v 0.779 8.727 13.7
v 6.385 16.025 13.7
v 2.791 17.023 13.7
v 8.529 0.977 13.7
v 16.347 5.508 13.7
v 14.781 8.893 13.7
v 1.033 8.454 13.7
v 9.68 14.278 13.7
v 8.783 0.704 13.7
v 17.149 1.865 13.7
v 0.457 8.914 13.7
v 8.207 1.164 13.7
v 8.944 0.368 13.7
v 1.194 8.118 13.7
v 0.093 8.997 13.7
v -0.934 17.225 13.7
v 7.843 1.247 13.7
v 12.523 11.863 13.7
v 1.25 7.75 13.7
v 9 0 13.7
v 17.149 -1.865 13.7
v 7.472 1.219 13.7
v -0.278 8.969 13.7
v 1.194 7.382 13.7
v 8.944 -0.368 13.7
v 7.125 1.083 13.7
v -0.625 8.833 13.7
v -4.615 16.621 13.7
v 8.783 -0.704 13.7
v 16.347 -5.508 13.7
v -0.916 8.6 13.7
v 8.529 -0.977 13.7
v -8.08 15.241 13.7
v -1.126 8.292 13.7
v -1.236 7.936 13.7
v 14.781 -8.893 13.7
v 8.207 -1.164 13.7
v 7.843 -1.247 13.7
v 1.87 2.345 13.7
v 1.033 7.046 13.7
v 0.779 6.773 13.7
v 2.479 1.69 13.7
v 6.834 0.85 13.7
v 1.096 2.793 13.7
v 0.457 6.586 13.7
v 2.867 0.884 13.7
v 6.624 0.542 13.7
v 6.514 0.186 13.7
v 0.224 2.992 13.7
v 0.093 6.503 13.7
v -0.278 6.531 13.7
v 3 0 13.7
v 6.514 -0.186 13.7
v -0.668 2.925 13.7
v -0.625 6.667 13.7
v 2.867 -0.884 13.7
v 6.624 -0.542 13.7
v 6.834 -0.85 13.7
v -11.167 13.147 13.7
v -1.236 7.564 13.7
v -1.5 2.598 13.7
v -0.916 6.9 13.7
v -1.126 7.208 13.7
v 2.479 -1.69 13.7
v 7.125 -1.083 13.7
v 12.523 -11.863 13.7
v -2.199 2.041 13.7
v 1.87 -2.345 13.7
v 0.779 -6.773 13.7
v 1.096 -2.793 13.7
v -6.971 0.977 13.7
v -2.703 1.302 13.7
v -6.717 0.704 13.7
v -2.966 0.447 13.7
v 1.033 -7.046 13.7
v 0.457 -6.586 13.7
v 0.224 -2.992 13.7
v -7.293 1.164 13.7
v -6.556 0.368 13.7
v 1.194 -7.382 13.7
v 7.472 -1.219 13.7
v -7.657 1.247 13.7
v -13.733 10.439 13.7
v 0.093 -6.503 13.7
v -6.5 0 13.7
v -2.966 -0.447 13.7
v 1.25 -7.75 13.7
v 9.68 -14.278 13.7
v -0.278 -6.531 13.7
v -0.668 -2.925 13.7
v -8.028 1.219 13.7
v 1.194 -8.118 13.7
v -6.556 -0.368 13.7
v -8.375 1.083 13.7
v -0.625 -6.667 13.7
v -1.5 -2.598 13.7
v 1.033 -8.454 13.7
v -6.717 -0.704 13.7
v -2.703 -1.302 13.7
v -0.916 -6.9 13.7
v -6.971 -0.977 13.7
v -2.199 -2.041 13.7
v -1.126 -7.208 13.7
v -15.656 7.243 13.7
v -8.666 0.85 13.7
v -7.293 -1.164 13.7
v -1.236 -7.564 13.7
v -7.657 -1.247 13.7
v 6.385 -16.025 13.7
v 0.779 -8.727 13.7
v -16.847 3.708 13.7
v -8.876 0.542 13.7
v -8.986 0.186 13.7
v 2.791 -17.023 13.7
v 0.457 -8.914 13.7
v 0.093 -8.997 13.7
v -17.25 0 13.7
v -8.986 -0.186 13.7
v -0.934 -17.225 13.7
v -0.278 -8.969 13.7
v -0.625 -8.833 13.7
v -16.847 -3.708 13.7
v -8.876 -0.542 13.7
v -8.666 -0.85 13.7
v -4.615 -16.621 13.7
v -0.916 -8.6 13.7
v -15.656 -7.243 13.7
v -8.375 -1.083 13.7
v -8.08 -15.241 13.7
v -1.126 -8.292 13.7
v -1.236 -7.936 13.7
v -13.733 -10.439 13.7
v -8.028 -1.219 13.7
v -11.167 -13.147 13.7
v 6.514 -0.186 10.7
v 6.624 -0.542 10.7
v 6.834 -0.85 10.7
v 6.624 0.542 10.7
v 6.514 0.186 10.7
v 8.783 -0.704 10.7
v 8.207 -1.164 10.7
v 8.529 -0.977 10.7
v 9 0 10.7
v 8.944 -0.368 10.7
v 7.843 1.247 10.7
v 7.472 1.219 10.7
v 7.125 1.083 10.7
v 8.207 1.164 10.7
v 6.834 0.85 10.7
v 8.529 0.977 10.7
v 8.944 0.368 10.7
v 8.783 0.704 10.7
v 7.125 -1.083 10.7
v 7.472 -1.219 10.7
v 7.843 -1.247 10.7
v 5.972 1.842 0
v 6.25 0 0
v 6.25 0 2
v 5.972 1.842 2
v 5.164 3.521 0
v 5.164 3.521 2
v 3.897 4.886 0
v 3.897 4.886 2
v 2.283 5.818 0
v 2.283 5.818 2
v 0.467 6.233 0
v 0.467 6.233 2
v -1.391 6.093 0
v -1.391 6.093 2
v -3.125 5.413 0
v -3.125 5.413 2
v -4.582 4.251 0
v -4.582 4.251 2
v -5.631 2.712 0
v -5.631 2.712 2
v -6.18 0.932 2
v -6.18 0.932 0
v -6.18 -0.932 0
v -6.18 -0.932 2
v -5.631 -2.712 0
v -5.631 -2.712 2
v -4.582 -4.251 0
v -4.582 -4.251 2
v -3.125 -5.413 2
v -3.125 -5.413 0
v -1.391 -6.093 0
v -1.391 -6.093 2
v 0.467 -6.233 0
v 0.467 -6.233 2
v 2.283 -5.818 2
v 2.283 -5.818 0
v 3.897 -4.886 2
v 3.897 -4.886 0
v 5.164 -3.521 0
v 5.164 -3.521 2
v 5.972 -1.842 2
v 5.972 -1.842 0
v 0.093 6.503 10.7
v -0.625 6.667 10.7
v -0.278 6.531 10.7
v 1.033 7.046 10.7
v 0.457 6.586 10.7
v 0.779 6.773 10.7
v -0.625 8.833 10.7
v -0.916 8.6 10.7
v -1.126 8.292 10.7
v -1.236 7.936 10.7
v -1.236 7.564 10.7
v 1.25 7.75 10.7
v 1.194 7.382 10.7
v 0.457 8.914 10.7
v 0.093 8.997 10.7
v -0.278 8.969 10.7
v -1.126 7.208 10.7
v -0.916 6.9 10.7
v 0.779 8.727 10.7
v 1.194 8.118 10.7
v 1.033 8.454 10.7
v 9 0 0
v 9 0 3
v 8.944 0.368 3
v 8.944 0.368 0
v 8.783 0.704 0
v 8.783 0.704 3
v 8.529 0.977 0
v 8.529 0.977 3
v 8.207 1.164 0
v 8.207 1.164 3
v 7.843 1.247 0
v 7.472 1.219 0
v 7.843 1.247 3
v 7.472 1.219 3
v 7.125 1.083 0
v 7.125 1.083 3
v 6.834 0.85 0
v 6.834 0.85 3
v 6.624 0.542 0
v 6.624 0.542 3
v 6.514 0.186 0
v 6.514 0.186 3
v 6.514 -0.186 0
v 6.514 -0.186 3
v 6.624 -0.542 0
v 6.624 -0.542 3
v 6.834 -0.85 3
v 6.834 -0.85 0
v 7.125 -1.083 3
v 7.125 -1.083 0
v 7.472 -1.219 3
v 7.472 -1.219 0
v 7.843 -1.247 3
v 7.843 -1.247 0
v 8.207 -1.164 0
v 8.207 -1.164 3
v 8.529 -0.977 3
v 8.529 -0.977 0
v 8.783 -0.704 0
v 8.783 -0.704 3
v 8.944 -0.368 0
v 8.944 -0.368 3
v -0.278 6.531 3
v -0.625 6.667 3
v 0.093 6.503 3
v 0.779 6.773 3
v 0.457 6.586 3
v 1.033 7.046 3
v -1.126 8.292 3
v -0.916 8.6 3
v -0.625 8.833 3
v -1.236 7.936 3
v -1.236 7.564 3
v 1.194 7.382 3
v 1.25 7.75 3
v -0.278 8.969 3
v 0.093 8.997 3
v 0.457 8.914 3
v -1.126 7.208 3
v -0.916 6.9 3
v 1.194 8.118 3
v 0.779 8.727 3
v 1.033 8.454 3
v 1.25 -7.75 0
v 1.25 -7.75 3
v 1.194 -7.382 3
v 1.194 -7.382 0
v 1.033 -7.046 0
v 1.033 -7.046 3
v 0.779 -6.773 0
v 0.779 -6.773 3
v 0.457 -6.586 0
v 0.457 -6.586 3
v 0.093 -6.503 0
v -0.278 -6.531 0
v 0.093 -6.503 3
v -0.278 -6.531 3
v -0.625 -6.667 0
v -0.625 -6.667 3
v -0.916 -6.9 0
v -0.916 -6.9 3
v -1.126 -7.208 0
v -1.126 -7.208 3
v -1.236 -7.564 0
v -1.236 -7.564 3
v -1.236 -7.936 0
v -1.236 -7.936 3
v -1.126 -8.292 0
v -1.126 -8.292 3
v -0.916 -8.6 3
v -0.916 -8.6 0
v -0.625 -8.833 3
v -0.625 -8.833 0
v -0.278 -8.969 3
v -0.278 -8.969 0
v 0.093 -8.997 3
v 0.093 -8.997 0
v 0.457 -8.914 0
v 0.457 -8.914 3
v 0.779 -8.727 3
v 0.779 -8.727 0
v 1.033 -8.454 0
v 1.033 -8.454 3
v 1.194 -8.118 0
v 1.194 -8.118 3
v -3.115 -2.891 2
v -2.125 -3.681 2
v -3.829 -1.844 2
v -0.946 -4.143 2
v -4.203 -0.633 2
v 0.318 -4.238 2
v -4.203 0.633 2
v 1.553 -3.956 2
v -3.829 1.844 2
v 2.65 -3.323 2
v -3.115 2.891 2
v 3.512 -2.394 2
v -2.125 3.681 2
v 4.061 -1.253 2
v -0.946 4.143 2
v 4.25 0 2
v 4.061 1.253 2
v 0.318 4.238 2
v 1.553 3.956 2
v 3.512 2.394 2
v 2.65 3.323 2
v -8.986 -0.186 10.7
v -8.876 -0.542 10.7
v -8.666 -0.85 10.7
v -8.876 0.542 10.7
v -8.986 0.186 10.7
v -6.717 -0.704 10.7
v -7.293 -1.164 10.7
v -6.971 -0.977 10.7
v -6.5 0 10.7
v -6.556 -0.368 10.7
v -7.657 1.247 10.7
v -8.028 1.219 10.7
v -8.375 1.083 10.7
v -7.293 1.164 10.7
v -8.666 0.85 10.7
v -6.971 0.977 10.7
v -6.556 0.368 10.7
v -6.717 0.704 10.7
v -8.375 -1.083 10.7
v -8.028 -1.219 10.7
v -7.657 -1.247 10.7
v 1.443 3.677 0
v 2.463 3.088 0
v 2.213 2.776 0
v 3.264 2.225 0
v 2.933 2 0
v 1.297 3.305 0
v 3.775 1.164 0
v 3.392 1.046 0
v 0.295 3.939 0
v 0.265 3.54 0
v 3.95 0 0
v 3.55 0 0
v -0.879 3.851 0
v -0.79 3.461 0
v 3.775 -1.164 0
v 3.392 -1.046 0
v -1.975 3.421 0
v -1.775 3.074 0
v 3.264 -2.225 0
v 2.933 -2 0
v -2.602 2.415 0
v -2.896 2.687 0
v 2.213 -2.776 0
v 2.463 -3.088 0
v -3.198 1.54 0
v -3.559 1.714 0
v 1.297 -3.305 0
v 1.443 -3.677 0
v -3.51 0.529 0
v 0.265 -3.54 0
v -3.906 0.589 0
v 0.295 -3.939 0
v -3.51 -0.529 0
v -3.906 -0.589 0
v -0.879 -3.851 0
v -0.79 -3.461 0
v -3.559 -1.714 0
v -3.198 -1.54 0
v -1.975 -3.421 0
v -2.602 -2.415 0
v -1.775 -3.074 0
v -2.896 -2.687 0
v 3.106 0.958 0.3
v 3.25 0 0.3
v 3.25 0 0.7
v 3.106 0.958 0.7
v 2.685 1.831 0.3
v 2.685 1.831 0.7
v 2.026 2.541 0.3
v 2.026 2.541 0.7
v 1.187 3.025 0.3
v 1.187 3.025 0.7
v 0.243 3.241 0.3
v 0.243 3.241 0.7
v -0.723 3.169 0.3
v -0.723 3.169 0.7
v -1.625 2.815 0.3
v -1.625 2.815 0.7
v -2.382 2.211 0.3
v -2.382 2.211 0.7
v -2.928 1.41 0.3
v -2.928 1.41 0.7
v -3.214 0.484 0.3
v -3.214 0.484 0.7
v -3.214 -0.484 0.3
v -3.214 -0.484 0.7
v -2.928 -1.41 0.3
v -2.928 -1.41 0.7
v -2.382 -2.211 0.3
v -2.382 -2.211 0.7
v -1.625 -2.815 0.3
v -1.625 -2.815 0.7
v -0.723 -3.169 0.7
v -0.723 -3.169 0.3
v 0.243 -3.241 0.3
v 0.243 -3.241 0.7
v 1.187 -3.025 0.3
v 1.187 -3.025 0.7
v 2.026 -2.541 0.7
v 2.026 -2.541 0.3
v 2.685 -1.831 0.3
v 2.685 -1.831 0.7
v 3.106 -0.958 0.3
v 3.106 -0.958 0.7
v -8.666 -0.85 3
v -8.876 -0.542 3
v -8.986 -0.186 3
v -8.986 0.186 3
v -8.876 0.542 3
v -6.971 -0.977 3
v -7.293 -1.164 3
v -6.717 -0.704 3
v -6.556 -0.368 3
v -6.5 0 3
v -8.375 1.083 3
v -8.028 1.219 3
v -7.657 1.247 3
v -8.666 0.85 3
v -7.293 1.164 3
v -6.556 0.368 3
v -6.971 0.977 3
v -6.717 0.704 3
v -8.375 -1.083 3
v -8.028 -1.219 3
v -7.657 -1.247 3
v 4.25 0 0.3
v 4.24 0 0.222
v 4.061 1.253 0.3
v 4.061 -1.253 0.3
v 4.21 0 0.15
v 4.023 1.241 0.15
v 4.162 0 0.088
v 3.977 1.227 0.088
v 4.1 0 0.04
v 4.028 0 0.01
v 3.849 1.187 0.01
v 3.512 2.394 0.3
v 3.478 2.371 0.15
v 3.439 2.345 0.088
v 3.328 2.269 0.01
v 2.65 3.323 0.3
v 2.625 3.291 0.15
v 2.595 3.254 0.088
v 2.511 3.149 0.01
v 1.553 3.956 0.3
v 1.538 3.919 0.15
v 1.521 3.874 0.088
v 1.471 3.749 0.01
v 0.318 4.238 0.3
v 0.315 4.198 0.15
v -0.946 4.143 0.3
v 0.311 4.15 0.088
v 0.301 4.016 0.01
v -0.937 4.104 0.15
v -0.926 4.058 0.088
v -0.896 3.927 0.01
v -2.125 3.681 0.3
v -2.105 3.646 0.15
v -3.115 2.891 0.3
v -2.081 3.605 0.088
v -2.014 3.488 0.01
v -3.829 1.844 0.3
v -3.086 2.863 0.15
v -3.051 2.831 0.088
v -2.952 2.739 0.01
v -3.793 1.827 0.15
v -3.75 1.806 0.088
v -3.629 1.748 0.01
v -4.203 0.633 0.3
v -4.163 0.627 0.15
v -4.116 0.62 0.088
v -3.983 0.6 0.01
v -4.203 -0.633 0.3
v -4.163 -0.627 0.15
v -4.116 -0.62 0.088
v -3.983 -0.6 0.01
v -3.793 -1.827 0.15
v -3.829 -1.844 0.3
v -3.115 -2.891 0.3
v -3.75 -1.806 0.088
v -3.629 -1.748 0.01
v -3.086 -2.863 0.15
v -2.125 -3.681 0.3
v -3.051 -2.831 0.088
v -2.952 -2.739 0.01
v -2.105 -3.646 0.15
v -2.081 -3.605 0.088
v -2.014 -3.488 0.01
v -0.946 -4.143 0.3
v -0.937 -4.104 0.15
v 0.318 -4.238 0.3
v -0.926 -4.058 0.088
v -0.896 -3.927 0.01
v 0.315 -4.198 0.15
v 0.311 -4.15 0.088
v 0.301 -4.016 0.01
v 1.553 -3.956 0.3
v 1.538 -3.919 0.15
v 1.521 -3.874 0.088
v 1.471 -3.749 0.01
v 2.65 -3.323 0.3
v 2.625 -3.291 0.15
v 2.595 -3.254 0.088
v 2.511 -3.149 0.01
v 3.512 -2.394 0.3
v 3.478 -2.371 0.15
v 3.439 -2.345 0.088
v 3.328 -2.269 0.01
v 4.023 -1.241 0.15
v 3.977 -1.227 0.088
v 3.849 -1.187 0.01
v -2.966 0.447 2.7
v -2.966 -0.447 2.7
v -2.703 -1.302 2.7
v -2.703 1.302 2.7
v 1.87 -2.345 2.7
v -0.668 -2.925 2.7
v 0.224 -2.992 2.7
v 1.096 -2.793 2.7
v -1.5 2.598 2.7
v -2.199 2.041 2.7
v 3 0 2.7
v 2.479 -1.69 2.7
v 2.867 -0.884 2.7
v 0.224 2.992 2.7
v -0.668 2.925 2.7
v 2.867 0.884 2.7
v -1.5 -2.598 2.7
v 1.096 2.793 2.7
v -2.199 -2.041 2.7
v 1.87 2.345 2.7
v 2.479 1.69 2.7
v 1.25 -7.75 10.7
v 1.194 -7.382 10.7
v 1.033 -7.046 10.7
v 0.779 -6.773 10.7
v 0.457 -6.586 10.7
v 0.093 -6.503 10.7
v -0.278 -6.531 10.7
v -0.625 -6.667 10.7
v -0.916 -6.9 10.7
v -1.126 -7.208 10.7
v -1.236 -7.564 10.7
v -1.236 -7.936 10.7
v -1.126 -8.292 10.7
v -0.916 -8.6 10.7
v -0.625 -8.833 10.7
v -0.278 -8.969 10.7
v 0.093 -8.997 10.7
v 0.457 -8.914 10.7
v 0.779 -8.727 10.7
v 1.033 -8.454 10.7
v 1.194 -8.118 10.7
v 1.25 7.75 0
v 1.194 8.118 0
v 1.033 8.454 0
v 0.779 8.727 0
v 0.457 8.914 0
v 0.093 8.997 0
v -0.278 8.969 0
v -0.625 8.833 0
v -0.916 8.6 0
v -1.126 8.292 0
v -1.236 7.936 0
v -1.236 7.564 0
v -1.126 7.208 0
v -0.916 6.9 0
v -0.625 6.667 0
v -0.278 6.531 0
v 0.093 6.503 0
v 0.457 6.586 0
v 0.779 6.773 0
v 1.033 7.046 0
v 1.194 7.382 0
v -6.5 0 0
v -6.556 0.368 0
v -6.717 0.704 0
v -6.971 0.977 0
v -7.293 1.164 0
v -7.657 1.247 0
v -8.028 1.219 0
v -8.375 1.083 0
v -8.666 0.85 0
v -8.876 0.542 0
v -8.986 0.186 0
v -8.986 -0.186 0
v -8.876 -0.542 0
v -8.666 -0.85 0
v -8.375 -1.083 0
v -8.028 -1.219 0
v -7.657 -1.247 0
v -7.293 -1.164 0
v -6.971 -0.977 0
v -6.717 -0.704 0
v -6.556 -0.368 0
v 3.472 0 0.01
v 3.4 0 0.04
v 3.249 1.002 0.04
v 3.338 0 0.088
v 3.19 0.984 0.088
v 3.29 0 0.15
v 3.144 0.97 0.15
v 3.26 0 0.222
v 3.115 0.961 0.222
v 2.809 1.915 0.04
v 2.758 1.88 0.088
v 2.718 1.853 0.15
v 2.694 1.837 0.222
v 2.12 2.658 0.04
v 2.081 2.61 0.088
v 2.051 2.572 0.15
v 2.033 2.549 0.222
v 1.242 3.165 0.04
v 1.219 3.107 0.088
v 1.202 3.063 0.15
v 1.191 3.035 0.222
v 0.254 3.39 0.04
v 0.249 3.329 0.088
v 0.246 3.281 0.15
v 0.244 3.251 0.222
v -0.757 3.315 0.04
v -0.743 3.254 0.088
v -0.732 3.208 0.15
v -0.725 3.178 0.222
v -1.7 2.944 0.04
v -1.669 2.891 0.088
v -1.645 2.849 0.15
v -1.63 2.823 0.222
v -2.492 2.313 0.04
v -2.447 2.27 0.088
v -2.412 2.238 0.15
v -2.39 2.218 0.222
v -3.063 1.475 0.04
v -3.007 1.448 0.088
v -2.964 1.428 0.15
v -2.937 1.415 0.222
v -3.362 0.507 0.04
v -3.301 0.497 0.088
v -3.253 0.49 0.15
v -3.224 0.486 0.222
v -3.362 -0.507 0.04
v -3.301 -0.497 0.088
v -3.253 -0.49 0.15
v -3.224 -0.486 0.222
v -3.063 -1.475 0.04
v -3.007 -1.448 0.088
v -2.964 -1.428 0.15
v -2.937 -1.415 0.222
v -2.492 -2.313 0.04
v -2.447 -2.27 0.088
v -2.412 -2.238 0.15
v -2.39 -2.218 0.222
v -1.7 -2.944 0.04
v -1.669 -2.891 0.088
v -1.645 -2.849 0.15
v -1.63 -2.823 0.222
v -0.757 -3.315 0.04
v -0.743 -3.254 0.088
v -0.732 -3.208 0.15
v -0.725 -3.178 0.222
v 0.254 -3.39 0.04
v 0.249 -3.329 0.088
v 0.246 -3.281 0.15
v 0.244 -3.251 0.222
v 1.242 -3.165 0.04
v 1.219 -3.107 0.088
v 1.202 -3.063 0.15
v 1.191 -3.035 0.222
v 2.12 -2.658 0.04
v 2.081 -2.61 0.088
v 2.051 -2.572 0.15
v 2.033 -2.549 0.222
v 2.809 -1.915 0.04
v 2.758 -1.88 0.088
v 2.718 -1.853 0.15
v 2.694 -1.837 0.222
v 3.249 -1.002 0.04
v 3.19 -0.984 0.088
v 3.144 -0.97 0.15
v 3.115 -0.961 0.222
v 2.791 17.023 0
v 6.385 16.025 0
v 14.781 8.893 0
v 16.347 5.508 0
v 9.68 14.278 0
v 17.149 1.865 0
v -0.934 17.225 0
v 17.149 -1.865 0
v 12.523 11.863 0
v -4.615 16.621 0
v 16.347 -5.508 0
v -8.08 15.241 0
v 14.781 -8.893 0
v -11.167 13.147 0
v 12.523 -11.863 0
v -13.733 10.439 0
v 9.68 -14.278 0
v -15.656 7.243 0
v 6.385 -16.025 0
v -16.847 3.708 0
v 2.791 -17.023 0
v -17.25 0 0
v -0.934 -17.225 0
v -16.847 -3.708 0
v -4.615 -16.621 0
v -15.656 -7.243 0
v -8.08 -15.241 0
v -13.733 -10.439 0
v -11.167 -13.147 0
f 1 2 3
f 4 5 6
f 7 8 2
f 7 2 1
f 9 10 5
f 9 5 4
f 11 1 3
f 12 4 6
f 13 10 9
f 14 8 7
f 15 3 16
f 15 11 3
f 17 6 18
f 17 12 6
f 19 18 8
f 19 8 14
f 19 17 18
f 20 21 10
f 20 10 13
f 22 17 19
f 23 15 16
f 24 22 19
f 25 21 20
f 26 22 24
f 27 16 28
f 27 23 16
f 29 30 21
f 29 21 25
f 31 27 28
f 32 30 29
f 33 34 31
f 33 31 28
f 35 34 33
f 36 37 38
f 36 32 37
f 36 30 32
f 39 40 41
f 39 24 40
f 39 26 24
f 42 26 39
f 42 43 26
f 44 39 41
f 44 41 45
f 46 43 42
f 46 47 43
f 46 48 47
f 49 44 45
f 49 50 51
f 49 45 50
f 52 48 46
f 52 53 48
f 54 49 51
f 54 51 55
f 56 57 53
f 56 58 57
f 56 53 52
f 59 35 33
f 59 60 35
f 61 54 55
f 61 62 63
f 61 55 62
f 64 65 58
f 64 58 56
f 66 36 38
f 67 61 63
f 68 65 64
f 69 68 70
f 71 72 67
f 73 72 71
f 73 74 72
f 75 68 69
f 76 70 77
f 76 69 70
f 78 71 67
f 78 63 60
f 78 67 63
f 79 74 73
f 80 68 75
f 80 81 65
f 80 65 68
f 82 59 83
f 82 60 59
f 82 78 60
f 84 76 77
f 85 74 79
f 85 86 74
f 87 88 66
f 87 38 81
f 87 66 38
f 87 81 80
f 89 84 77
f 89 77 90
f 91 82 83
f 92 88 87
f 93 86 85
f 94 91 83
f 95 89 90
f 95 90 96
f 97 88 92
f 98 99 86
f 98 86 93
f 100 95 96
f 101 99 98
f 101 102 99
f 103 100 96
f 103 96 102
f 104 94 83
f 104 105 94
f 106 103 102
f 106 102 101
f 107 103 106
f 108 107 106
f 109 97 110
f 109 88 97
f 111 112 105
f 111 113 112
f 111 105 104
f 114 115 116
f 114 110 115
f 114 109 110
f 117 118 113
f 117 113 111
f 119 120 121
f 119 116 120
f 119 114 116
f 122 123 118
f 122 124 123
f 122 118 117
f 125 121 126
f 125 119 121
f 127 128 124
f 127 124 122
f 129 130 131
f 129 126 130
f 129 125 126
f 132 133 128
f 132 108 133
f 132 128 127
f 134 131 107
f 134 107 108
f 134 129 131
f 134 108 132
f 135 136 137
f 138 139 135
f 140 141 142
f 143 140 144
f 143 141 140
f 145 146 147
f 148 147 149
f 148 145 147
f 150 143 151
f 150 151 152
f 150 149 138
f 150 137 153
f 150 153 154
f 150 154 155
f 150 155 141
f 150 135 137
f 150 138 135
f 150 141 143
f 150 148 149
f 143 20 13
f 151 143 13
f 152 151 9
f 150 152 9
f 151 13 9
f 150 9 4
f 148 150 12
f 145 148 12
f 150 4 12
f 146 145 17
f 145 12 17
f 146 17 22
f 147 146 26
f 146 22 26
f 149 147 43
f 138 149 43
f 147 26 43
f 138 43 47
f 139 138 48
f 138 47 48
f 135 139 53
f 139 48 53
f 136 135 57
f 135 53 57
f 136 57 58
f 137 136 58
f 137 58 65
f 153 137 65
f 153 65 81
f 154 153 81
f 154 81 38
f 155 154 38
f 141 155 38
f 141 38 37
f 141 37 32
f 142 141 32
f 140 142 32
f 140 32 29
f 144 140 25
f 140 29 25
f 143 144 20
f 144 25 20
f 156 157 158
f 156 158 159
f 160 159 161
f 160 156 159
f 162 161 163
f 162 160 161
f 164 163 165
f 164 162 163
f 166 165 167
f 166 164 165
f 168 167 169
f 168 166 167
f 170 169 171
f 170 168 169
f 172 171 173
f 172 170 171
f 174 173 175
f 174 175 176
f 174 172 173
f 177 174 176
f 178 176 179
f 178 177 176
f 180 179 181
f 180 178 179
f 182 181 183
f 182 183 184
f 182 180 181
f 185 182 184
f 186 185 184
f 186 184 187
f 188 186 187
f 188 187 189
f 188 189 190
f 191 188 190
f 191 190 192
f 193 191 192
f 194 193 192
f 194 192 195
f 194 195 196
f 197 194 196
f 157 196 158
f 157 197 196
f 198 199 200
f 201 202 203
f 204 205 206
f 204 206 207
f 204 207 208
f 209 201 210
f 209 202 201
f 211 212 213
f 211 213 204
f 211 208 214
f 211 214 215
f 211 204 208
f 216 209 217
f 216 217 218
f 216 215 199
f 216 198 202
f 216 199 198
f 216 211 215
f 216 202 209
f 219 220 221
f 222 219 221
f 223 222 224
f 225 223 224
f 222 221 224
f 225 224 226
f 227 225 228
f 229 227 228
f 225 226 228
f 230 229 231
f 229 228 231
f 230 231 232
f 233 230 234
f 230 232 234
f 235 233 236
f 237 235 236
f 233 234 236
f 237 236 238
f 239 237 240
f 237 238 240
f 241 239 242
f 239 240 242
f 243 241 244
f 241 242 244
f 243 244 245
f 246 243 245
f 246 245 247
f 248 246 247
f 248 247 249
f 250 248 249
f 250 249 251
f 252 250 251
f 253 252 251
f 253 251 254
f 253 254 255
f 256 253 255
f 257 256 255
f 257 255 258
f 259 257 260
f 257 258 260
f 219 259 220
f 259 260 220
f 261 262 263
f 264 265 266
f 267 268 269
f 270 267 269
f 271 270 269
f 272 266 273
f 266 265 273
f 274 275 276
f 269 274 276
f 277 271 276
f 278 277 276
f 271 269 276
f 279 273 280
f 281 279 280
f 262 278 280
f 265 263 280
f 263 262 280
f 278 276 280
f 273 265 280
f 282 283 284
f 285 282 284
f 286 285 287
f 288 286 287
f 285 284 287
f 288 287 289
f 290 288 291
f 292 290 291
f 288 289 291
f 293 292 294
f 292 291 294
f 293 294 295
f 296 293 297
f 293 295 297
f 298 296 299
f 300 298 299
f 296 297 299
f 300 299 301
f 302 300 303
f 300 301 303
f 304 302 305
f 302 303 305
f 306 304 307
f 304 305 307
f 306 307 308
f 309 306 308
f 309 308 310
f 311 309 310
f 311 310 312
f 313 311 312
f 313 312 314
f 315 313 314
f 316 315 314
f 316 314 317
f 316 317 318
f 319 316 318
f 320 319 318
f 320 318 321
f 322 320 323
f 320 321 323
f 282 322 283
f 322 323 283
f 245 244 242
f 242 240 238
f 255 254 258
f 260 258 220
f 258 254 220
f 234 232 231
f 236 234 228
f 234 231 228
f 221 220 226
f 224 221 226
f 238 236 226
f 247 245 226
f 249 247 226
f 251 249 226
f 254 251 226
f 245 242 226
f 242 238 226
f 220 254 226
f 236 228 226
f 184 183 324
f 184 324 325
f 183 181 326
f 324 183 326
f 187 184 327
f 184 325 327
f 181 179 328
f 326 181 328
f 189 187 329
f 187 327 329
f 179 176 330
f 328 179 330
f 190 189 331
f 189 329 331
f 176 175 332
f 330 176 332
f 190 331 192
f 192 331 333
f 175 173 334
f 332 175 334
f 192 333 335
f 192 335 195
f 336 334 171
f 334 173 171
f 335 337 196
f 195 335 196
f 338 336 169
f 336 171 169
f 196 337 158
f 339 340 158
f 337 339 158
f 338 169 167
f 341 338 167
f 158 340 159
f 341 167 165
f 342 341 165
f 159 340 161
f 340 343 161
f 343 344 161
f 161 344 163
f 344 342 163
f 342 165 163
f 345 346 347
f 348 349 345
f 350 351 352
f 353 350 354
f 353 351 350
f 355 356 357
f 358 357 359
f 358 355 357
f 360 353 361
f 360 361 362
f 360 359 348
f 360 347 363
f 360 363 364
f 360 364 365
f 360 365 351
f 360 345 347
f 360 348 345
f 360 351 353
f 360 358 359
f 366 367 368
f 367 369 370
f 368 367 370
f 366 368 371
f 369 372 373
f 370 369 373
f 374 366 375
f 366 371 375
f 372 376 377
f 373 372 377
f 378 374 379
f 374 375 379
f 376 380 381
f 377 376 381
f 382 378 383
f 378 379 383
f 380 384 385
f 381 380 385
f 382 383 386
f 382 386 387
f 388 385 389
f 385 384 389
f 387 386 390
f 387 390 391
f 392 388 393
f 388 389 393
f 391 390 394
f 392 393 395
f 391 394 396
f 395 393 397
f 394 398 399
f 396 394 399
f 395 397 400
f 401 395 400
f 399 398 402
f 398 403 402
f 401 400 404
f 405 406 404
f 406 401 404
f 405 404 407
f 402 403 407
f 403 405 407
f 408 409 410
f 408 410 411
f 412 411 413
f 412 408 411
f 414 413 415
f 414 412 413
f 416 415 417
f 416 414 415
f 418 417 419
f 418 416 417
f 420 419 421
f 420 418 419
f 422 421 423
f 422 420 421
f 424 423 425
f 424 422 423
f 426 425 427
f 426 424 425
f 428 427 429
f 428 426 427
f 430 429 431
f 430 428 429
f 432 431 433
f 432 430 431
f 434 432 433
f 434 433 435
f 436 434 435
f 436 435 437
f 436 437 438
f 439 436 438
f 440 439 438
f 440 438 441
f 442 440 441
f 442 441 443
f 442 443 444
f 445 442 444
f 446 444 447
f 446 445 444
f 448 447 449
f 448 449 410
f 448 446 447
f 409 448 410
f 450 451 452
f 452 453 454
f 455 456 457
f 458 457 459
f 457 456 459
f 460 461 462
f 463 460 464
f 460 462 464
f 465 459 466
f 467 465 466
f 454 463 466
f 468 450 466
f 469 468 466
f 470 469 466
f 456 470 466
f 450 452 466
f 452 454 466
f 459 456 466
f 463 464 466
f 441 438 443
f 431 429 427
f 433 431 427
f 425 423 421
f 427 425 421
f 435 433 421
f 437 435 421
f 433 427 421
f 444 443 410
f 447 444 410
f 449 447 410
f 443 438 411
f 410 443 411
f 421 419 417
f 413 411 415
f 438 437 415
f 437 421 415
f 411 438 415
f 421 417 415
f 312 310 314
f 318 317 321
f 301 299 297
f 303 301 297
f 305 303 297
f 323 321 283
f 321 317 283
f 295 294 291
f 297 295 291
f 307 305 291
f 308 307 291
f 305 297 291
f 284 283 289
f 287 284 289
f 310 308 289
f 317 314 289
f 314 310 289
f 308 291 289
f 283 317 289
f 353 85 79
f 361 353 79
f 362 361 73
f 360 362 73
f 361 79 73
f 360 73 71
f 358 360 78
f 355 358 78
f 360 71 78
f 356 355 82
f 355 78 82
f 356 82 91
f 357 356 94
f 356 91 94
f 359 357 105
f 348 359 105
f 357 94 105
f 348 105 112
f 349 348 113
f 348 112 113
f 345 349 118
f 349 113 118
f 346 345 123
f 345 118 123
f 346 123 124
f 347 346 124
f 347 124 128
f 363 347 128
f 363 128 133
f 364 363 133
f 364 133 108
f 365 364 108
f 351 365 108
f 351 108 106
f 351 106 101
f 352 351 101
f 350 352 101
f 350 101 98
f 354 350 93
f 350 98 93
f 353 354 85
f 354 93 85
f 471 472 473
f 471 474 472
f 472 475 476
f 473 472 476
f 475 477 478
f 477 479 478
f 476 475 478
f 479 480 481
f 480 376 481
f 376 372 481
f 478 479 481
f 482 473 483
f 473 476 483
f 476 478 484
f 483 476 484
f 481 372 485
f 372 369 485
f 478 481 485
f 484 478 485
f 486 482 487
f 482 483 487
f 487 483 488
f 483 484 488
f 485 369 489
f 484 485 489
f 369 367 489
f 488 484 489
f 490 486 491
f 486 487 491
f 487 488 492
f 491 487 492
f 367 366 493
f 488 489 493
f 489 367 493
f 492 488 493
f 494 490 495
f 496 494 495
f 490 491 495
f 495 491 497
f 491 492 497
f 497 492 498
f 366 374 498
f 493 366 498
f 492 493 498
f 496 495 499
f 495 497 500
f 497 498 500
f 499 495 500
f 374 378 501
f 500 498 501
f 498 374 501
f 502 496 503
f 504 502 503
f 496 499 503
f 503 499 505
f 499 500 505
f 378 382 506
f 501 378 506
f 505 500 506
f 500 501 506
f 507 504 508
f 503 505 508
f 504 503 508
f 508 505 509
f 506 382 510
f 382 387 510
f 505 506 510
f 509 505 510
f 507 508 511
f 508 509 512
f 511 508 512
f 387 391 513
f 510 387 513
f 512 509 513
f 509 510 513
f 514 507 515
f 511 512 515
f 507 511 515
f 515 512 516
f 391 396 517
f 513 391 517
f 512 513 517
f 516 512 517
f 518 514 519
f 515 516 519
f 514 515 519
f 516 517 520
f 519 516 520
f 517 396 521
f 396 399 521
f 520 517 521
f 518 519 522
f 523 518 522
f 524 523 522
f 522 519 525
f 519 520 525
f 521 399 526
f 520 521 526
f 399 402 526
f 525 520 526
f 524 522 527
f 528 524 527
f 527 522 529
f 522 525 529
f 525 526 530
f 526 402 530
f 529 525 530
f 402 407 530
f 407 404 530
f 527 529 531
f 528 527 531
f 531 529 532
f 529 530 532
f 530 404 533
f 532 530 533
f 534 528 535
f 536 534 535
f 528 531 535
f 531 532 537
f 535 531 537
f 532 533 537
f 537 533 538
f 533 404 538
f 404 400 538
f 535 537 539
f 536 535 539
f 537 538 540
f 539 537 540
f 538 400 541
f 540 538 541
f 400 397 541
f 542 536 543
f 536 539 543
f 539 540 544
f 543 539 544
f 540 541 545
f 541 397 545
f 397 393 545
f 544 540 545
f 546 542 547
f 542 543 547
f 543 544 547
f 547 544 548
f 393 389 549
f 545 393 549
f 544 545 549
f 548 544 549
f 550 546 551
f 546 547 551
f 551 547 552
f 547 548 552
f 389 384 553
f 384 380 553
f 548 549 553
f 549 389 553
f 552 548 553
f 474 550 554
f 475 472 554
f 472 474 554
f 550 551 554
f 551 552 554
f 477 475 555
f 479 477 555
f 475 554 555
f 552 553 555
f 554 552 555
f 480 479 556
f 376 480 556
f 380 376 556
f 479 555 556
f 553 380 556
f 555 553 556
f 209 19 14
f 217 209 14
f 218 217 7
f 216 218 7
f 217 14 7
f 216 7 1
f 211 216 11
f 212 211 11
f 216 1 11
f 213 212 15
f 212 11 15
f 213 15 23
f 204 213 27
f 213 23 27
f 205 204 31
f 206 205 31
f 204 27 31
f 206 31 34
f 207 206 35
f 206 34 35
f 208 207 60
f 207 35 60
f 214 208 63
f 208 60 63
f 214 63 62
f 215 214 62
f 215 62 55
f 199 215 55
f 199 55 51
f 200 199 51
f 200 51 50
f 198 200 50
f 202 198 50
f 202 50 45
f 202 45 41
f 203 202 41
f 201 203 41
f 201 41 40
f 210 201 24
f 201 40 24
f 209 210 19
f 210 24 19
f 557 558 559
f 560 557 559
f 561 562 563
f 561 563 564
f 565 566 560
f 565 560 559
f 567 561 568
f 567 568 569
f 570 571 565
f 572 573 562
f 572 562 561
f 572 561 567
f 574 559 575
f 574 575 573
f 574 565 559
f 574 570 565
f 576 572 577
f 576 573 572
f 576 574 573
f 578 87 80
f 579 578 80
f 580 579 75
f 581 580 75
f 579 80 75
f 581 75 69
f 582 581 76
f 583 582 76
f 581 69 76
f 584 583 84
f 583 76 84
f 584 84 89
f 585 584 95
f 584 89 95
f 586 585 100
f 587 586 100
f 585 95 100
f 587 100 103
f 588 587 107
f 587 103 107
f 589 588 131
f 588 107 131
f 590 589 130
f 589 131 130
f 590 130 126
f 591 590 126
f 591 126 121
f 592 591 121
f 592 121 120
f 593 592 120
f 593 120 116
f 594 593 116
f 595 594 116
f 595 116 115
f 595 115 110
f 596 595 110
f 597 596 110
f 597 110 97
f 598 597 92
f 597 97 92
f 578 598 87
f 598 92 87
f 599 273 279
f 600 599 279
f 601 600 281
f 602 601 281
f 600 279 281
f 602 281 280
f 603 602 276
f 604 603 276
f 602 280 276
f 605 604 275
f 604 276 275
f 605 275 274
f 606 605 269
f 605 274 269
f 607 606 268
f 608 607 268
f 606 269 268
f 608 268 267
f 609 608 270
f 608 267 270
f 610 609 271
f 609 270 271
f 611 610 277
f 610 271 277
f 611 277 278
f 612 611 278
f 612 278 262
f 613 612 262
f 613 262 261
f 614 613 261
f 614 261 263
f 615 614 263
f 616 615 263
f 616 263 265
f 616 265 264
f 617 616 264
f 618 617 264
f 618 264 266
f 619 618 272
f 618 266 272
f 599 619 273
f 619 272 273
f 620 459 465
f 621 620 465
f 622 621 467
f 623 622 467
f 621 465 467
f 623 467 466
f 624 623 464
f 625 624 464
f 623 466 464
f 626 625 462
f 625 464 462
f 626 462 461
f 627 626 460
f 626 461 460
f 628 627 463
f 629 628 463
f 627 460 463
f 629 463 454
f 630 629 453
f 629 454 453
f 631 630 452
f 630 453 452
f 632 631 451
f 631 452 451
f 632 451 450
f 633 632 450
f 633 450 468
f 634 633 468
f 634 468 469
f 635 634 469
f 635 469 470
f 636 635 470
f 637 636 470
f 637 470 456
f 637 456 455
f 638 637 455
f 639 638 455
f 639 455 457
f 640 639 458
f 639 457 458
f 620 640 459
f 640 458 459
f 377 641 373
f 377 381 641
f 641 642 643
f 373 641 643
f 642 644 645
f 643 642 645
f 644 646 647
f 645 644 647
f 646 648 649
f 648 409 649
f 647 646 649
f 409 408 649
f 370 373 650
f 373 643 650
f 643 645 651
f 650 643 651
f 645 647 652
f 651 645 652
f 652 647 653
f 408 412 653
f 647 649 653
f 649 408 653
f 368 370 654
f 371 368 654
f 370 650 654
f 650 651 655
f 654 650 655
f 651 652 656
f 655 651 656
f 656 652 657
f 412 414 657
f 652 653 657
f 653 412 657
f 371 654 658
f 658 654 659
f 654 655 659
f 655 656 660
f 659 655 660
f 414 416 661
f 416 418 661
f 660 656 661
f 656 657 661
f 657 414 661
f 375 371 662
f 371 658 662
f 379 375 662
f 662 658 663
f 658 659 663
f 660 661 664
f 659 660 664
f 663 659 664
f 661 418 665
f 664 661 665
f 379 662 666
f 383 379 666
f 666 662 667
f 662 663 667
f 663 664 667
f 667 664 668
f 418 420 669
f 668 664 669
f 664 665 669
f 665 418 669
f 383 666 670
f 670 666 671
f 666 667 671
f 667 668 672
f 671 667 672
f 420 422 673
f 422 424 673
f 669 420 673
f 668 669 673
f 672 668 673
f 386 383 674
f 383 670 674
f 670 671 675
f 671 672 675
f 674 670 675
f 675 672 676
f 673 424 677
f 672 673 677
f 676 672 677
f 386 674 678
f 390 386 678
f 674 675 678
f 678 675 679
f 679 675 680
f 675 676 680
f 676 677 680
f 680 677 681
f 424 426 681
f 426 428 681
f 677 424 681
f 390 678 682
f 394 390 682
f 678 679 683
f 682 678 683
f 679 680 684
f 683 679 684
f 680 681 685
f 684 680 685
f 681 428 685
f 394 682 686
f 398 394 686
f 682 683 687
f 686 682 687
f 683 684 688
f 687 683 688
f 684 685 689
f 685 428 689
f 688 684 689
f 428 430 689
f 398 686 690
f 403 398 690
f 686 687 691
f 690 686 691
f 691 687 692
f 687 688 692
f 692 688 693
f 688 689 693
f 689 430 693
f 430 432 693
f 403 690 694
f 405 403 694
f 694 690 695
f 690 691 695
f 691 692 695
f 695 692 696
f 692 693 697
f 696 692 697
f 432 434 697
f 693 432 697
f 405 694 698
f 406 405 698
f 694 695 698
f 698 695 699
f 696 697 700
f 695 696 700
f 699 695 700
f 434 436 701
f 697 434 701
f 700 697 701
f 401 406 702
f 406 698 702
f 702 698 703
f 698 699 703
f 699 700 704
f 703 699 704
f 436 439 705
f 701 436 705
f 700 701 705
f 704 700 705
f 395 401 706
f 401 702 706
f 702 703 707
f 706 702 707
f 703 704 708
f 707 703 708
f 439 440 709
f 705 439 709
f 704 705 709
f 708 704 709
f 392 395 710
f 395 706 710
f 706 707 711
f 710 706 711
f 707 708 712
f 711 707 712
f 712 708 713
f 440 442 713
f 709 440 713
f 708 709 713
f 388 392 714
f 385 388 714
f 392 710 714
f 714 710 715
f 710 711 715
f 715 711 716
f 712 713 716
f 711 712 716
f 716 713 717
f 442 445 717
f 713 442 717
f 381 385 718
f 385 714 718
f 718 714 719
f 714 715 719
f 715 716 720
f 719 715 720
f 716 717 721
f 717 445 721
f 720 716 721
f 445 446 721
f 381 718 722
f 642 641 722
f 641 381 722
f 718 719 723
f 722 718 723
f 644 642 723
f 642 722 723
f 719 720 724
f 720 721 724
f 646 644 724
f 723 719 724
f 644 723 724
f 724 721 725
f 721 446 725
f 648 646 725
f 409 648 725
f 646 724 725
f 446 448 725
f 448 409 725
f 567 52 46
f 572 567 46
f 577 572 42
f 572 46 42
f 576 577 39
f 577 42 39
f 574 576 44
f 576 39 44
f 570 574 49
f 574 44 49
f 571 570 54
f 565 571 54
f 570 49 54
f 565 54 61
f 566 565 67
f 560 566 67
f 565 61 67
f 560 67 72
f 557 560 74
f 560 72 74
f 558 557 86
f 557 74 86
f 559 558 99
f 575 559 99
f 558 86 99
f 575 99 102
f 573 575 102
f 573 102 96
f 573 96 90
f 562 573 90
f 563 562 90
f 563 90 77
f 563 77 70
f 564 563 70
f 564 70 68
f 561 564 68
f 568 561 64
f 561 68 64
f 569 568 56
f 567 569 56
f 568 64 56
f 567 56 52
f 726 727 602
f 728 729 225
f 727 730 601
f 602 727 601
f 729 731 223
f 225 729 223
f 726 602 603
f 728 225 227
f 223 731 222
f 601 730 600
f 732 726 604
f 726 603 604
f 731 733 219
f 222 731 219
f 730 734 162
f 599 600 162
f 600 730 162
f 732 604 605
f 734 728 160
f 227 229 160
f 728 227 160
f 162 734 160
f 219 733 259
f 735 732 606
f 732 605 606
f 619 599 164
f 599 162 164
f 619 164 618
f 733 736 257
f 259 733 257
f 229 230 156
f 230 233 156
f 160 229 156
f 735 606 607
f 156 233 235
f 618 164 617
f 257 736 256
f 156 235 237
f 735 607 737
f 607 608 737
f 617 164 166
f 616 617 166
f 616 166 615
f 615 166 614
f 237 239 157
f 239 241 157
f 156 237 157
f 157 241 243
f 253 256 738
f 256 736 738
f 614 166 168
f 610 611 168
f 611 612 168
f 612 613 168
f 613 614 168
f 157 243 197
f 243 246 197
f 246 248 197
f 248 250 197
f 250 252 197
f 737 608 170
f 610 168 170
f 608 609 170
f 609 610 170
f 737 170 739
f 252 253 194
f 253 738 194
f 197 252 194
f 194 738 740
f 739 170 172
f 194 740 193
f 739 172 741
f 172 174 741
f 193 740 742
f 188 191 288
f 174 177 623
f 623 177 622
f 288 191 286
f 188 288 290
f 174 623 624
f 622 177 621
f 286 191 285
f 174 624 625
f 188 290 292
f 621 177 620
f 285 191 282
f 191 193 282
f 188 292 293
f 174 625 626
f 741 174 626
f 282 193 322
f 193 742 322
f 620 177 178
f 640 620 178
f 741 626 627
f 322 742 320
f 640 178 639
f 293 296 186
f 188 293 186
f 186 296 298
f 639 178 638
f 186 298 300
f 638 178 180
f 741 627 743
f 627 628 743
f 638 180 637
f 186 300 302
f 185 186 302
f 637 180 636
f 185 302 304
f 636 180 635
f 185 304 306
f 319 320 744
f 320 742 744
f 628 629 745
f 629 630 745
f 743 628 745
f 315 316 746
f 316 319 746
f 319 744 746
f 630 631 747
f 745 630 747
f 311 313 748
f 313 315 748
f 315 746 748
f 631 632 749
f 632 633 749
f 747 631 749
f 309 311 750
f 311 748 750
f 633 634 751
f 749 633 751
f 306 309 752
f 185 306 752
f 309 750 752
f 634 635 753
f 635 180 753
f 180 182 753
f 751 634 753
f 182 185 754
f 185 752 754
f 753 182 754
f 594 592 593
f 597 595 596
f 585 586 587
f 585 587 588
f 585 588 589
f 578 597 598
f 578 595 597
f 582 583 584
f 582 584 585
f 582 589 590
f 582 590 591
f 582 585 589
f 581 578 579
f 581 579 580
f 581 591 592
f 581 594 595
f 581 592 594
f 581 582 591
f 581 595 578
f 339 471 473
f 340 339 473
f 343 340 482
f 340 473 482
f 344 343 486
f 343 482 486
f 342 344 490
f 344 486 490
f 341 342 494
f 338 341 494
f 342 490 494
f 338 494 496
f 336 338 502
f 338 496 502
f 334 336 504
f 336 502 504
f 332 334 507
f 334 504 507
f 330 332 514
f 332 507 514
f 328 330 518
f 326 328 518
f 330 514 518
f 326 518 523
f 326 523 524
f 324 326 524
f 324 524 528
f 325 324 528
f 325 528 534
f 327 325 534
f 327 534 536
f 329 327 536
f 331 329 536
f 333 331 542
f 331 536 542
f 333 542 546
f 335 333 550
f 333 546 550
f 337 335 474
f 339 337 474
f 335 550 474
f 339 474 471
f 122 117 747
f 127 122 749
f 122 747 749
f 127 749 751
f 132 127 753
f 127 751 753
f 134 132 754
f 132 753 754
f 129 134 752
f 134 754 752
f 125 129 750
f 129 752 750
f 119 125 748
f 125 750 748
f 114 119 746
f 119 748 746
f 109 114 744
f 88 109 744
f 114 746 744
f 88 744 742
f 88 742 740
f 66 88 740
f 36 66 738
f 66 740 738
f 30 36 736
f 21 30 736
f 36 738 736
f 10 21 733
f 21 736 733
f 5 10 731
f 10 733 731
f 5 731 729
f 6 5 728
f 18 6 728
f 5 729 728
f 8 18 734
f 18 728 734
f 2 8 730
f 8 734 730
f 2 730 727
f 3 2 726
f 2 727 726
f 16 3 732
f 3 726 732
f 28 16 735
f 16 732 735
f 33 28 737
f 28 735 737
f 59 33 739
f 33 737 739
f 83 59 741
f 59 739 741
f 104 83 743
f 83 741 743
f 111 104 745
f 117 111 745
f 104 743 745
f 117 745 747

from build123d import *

# Parameters (mm, degrees)
SKETCH_1_R          = 17.25
EXTRUDE_1_DEPTH     = 13.7
SKETCH_2_R          = 1.25
CUT_EXTRUDE_1_DEPTH = 3
CUT_EXTRUDE_START   = 3
SKETCH_3_R          = 1.25
CUT_EXTRUDE_2_DEPTH = 3
SKETCH_4_R          = 6.25
SKETCH_4_R_2        = 4.25
CUT_EXTRUDE_3_DEPTH = 2
SKETCH_5_R          = 3.25
CUT_EXTRUDE_4_DEPTH = 0.7
FILLET_1_R          = 0.3
SKETCH_6_R          = 3
CUT_EXTRUDE_6_DEPTH = 11


with BuildPart() as part:
    # 草图1 → 凸台-拉伸1 (new body)
    with BuildSketch(Plane.XY):
        with Locations(Location((0, 0, 0), (0, 0, 180))):
            Circle(SKETCH_1_R)
    extrude(amount=EXTRUDE_1_DEPTH)

    # 草图2 → 切除-拉伸1 (cut)
    with BuildSketch(Plane.XY.offset(13.7)):
        with Locations((0, 7.75)):
            Circle(SKETCH_2_R)
        with Locations((7.75, 0)):
            Circle(SKETCH_2_R)
        with Locations((0, -7.75)):
            Circle(SKETCH_2_R)
        with Locations((-7.75, 0)):
            Circle(SKETCH_2_R)
    extrude(amount=-CUT_EXTRUDE_1_DEPTH, mode=Mode.SUBTRACT)

    # 草图3 → 切除-拉伸2 (cut)
    with BuildSketch(Plane.XY.offset(CUT_EXTRUDE_START)):
        with Locations((0, 7.75)):
            Circle(SKETCH_3_R)
        with Locations((7.75, 0)):
            Circle(SKETCH_3_R)
        with Locations((0, -7.75)):
            Circle(SKETCH_3_R)
        with Locations((-7.75, 0)):
            Circle(SKETCH_3_R)
    extrude(amount=-CUT_EXTRUDE_2_DEPTH, mode=Mode.SUBTRACT)

    # 草图4 → 切除-拉伸3 (cut)
    with BuildSketch(Plane.XY):
        Circle(SKETCH_4_R)
        Circle(SKETCH_4_R_2, mode=Mode.SUBTRACT)
    extrude(amount=CUT_EXTRUDE_3_DEPTH, mode=Mode.SUBTRACT)

    # 草图5 → 切除-拉伸4 (cut)
    with BuildSketch(Plane.XY):
        Circle(SKETCH_5_R)
    extrude(amount=CUT_EXTRUDE_4_DEPTH, mode=Mode.SUBTRACT)

    # 圆角1
    fillet_1_edges = [part.edges().sort_by_distance(p)[0] for p in [
        (-4.25, 0, 0),
        (-3.25, 0, 0),
    ]]
    fillet(fillet_1_edges, radius=FILLET_1_R)

    # 草图6 → 切除-拉伸6 (cut)
    with BuildSketch(Plane.XY.offset(13.7)):
        Circle(SKETCH_6_R)
    extrude(amount=-CUT_EXTRUDE_6_DEPTH, mode=Mode.SUBTRACT)


solid = part.part
